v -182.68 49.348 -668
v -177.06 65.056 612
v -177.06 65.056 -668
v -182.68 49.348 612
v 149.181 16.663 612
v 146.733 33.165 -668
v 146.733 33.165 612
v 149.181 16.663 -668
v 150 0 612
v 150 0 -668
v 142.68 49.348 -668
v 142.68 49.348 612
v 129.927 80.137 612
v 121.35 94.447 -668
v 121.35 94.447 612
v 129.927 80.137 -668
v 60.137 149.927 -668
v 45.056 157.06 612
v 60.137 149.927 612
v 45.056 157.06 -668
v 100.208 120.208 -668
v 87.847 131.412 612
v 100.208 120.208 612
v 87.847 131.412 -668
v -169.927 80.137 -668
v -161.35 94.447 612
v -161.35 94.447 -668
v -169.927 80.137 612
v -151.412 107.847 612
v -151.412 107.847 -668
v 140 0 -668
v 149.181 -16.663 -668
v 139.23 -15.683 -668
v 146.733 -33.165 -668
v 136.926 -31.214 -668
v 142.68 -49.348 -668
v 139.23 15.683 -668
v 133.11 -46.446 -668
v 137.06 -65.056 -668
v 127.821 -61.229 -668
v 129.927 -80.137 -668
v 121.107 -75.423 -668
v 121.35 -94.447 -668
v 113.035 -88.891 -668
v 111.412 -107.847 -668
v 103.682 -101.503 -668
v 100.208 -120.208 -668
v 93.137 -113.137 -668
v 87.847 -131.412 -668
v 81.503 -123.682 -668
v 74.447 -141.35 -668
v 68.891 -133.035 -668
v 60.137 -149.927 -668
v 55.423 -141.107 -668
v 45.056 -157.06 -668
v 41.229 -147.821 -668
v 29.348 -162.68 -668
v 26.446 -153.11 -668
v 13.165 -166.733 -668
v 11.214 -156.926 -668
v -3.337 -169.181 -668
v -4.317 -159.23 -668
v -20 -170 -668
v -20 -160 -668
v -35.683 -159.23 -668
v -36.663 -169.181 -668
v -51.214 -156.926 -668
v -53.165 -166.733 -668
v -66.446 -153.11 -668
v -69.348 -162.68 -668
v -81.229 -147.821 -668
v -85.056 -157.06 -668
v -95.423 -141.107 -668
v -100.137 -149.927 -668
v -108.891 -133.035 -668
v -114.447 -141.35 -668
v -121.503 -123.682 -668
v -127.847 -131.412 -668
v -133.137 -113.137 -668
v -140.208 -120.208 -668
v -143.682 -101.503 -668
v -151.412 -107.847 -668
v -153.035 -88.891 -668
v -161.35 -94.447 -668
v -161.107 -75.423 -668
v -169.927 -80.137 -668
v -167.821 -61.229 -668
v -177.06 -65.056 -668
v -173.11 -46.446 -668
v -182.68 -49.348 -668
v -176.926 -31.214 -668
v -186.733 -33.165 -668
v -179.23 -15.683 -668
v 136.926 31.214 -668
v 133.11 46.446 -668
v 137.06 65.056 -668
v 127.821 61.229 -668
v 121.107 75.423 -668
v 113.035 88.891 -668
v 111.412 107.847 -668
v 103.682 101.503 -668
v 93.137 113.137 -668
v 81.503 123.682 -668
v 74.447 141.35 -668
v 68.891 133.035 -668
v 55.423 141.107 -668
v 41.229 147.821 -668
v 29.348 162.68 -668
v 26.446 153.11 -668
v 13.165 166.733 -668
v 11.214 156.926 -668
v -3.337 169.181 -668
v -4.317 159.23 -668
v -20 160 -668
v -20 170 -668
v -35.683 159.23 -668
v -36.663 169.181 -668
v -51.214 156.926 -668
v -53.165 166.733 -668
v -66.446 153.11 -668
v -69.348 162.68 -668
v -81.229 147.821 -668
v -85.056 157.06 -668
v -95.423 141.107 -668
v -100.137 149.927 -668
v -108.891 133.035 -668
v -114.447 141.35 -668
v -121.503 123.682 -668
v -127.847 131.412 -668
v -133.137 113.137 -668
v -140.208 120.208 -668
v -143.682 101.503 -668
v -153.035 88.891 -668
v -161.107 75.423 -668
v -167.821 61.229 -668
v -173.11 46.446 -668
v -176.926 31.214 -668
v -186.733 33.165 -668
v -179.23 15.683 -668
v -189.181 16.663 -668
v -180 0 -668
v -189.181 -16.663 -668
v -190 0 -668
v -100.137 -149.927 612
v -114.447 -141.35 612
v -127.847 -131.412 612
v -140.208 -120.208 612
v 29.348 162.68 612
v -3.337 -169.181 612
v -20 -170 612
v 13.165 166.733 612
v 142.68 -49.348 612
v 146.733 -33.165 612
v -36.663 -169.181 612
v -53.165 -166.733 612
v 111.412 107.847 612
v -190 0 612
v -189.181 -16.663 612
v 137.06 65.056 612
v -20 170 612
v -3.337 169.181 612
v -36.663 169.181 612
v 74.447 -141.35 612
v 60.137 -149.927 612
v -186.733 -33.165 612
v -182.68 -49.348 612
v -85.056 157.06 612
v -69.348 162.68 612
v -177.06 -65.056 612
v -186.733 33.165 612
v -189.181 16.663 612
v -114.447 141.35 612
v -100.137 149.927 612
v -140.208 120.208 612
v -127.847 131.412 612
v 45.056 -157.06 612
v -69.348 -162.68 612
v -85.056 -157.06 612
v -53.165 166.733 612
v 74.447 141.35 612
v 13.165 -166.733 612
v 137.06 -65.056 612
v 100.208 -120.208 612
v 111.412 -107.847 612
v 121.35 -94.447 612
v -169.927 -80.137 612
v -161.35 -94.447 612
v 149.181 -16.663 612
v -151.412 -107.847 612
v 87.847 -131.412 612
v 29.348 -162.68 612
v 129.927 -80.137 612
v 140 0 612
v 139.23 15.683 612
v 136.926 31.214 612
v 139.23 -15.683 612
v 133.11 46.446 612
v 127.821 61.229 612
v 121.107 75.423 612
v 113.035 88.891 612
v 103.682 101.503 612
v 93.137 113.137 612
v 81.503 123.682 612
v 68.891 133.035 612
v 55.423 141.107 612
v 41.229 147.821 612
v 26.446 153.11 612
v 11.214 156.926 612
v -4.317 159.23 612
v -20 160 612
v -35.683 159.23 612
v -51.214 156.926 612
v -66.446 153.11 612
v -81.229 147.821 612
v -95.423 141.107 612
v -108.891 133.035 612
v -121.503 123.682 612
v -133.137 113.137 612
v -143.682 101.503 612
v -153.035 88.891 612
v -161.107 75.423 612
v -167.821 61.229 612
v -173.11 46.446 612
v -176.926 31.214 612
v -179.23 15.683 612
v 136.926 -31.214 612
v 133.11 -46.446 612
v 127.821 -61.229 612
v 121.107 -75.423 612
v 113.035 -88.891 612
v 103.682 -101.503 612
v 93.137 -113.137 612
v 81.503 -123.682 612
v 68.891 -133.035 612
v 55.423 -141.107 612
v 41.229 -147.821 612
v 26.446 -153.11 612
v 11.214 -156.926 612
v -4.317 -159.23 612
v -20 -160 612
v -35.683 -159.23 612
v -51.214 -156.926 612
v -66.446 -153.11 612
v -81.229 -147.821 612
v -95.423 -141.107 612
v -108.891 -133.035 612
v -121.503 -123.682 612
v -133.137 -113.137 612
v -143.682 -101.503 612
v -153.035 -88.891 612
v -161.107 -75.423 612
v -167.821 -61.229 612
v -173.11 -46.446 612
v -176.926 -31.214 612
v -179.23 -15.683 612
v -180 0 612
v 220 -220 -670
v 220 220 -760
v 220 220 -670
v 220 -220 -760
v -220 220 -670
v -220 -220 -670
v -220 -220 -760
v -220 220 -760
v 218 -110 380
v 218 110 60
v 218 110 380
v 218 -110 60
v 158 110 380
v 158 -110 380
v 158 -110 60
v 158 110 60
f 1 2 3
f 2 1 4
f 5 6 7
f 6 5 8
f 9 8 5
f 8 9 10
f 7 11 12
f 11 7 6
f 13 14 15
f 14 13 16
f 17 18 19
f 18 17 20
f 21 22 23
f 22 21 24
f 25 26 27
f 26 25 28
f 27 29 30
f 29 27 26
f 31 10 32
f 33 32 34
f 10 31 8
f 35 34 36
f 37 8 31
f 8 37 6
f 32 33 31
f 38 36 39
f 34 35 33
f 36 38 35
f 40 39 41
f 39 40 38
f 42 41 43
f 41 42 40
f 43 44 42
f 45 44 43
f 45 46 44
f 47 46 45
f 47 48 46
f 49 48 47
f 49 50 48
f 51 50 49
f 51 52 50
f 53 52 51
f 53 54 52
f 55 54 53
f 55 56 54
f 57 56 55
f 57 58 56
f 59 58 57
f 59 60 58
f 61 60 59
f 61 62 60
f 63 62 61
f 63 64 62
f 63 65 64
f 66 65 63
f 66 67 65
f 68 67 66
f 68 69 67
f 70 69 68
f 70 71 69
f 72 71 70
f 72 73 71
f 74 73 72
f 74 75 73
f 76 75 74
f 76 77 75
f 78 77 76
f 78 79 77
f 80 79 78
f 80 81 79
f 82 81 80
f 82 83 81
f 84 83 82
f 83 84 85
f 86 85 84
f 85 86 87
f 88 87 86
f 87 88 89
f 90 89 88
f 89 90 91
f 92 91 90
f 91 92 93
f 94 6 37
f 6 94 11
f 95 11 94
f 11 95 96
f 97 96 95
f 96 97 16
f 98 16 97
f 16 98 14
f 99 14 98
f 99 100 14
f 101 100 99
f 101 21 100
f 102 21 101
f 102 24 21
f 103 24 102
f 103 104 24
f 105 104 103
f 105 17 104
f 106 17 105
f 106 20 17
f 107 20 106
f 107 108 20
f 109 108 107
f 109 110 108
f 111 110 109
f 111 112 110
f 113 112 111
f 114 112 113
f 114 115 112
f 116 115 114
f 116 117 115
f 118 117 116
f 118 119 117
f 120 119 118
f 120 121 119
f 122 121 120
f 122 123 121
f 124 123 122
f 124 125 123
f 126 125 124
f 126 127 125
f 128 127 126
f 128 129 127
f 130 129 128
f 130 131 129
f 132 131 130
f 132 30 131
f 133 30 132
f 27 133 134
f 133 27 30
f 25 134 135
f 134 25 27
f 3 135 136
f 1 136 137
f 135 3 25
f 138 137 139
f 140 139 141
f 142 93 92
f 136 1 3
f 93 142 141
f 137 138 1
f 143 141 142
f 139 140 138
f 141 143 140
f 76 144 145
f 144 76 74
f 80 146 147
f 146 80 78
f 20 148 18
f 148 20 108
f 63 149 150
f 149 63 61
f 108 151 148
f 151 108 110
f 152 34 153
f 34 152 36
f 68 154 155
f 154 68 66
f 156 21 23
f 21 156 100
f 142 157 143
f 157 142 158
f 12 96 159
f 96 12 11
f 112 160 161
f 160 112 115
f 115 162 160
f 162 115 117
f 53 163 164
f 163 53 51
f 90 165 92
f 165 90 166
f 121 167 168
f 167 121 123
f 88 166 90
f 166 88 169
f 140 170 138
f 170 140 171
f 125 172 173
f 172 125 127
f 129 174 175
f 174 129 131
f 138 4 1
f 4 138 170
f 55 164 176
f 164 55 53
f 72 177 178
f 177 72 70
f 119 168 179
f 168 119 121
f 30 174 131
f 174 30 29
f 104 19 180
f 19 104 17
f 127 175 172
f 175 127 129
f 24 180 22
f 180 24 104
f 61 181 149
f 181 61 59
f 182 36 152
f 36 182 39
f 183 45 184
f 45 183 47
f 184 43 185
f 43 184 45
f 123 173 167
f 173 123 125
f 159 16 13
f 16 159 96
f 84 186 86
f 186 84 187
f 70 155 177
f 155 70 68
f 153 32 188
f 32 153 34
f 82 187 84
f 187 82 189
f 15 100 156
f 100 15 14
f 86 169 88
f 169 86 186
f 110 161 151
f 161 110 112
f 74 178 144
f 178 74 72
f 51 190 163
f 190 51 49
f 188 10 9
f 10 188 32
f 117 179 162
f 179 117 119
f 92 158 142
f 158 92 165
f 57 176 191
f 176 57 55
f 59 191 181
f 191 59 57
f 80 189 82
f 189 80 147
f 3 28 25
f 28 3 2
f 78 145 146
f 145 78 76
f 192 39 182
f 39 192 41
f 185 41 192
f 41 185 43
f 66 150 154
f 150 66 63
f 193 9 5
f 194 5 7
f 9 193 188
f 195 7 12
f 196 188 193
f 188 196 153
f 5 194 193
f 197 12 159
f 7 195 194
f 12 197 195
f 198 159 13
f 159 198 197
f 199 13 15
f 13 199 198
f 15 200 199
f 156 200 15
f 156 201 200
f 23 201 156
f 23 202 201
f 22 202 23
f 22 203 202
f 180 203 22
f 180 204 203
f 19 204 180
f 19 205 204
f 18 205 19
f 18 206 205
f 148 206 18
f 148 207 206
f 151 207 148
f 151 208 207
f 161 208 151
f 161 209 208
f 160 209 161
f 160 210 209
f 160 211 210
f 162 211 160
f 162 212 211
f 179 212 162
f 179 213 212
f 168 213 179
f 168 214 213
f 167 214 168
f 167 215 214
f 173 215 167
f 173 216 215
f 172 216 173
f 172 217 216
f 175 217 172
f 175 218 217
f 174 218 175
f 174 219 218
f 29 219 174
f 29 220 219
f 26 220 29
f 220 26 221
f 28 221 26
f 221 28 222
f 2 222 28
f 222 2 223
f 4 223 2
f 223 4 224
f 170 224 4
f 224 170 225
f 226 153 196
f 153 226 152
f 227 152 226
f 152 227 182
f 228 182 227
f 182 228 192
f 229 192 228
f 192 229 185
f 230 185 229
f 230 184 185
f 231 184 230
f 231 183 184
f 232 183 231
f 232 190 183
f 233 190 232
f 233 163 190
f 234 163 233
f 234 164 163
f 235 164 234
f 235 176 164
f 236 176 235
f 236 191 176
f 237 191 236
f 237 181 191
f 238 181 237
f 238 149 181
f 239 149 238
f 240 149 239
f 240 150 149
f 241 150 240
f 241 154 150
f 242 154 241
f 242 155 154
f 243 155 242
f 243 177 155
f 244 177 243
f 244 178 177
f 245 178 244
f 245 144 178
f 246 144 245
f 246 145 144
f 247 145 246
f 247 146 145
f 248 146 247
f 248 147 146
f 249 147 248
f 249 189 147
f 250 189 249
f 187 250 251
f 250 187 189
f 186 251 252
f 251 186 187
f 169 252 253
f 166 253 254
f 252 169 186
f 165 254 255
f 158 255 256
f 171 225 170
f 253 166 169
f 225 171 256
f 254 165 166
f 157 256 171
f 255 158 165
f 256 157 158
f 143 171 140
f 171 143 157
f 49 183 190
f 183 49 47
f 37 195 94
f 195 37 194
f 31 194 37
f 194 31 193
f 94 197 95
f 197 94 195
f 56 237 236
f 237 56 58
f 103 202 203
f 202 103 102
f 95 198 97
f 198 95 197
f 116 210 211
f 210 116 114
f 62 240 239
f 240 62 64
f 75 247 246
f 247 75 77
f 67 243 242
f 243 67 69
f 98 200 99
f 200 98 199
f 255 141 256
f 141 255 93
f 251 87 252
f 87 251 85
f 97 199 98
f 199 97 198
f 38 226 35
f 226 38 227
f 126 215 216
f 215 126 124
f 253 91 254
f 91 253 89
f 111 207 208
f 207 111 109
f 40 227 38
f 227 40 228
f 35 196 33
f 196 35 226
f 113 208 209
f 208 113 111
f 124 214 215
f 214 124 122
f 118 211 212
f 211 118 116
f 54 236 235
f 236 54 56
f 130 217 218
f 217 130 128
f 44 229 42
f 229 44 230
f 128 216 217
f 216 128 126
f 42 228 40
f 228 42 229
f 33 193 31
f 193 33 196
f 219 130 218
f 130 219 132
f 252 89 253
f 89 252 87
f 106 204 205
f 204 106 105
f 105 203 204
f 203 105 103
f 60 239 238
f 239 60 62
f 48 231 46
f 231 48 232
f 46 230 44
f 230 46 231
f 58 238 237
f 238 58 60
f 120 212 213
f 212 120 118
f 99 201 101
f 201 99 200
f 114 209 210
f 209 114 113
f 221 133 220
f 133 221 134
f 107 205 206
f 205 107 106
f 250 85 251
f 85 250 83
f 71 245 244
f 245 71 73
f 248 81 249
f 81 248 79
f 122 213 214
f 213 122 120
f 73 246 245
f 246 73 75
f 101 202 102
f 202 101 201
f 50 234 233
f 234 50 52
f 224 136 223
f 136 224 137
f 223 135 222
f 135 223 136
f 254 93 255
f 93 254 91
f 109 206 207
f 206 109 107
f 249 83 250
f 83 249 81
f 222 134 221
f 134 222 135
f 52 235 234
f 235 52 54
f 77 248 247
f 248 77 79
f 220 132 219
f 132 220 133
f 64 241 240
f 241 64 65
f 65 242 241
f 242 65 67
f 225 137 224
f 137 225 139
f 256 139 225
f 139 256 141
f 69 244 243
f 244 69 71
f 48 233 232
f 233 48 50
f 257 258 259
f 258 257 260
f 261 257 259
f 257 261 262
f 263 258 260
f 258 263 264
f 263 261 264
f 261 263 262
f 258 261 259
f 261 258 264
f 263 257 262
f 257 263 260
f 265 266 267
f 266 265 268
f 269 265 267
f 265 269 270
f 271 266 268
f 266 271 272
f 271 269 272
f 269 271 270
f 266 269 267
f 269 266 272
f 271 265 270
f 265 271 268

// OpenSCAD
// ============================================================================
// Atom Lithography Machine — Parametric OpenSCAD Module (S1.6-02)
// ============================================================================
// part_id           : S1.6-02
// parent_bom_id     : S1.6
// subsystem         : S1
// part_name         : Kuru-yatakli PH3 gaz yikayici (scrubber) ve 50 ppb gaz dedektoru
// material          : Steel
// temp_stage        : 300 K (tesis)
// vacuum_grade      : Egzoz hatti
// tolerance         : ±10 ppb alarm
// computed_mass_kg  : 118.38646
// envelope_mm       : 440.000 x 440.000 x 1519.000
// design_maturity   : M0_M1_DETAILED_CAD_DESIGN_ONLY
// no_lab_measurement: true
// iec61508_certified: false
// semi_s2_certified : false
// Units: millimeters (mm)
// ============================================================================

$fn = 64;

// Nominal bounding envelope parameters (mm)
bbox_x = 440.0000;
bbox_y = 440.0000;
bbox_z = 1519.0000;

// Part-specific parametric dimensions
skid_xy = 440.0;
col_od = 340.0;
total_h = 1520.0;
alarm_ppb = 50.0;

// Interface / port parameters (mm)
port_scrubber_inlet_od = 152.000;
port_scrubber_inlet_bore = 144.000;
port_scrubber_exhaust_od = 152.000;
port_scrubber_exhaust_bore = 144.000;

module part_S1_6_02() {
  union() {
    // Welded steel scrubber skid
    translate([0.000, 0.000, -715.000]) cube([440.000, 440.000, 90.000], center=true);
    // Dry-bed catalytic PH3 absorber tower
    translate([-20.000, 0.000, -28.000]) {
      difference() {
        cylinder(d=340.000, h=1280.000, center=true);
        cylinder(d=320.000, h=1282.000, center=true);
      }
    }
    // 50 ppb electrochemical detector & PLC panel
    translate([188.000, 0.000, 220.000]) cube([60.000, 220.000, 320.000], center=true);
  }
}

// World assembly mounting transform (global machine frame, mm / deg):
// translate([-1350.000, 1650.000, 260.000]) rotate([0.000, 0.000, 0.000]) part_S1_6_02();

part_S1_6_02();
